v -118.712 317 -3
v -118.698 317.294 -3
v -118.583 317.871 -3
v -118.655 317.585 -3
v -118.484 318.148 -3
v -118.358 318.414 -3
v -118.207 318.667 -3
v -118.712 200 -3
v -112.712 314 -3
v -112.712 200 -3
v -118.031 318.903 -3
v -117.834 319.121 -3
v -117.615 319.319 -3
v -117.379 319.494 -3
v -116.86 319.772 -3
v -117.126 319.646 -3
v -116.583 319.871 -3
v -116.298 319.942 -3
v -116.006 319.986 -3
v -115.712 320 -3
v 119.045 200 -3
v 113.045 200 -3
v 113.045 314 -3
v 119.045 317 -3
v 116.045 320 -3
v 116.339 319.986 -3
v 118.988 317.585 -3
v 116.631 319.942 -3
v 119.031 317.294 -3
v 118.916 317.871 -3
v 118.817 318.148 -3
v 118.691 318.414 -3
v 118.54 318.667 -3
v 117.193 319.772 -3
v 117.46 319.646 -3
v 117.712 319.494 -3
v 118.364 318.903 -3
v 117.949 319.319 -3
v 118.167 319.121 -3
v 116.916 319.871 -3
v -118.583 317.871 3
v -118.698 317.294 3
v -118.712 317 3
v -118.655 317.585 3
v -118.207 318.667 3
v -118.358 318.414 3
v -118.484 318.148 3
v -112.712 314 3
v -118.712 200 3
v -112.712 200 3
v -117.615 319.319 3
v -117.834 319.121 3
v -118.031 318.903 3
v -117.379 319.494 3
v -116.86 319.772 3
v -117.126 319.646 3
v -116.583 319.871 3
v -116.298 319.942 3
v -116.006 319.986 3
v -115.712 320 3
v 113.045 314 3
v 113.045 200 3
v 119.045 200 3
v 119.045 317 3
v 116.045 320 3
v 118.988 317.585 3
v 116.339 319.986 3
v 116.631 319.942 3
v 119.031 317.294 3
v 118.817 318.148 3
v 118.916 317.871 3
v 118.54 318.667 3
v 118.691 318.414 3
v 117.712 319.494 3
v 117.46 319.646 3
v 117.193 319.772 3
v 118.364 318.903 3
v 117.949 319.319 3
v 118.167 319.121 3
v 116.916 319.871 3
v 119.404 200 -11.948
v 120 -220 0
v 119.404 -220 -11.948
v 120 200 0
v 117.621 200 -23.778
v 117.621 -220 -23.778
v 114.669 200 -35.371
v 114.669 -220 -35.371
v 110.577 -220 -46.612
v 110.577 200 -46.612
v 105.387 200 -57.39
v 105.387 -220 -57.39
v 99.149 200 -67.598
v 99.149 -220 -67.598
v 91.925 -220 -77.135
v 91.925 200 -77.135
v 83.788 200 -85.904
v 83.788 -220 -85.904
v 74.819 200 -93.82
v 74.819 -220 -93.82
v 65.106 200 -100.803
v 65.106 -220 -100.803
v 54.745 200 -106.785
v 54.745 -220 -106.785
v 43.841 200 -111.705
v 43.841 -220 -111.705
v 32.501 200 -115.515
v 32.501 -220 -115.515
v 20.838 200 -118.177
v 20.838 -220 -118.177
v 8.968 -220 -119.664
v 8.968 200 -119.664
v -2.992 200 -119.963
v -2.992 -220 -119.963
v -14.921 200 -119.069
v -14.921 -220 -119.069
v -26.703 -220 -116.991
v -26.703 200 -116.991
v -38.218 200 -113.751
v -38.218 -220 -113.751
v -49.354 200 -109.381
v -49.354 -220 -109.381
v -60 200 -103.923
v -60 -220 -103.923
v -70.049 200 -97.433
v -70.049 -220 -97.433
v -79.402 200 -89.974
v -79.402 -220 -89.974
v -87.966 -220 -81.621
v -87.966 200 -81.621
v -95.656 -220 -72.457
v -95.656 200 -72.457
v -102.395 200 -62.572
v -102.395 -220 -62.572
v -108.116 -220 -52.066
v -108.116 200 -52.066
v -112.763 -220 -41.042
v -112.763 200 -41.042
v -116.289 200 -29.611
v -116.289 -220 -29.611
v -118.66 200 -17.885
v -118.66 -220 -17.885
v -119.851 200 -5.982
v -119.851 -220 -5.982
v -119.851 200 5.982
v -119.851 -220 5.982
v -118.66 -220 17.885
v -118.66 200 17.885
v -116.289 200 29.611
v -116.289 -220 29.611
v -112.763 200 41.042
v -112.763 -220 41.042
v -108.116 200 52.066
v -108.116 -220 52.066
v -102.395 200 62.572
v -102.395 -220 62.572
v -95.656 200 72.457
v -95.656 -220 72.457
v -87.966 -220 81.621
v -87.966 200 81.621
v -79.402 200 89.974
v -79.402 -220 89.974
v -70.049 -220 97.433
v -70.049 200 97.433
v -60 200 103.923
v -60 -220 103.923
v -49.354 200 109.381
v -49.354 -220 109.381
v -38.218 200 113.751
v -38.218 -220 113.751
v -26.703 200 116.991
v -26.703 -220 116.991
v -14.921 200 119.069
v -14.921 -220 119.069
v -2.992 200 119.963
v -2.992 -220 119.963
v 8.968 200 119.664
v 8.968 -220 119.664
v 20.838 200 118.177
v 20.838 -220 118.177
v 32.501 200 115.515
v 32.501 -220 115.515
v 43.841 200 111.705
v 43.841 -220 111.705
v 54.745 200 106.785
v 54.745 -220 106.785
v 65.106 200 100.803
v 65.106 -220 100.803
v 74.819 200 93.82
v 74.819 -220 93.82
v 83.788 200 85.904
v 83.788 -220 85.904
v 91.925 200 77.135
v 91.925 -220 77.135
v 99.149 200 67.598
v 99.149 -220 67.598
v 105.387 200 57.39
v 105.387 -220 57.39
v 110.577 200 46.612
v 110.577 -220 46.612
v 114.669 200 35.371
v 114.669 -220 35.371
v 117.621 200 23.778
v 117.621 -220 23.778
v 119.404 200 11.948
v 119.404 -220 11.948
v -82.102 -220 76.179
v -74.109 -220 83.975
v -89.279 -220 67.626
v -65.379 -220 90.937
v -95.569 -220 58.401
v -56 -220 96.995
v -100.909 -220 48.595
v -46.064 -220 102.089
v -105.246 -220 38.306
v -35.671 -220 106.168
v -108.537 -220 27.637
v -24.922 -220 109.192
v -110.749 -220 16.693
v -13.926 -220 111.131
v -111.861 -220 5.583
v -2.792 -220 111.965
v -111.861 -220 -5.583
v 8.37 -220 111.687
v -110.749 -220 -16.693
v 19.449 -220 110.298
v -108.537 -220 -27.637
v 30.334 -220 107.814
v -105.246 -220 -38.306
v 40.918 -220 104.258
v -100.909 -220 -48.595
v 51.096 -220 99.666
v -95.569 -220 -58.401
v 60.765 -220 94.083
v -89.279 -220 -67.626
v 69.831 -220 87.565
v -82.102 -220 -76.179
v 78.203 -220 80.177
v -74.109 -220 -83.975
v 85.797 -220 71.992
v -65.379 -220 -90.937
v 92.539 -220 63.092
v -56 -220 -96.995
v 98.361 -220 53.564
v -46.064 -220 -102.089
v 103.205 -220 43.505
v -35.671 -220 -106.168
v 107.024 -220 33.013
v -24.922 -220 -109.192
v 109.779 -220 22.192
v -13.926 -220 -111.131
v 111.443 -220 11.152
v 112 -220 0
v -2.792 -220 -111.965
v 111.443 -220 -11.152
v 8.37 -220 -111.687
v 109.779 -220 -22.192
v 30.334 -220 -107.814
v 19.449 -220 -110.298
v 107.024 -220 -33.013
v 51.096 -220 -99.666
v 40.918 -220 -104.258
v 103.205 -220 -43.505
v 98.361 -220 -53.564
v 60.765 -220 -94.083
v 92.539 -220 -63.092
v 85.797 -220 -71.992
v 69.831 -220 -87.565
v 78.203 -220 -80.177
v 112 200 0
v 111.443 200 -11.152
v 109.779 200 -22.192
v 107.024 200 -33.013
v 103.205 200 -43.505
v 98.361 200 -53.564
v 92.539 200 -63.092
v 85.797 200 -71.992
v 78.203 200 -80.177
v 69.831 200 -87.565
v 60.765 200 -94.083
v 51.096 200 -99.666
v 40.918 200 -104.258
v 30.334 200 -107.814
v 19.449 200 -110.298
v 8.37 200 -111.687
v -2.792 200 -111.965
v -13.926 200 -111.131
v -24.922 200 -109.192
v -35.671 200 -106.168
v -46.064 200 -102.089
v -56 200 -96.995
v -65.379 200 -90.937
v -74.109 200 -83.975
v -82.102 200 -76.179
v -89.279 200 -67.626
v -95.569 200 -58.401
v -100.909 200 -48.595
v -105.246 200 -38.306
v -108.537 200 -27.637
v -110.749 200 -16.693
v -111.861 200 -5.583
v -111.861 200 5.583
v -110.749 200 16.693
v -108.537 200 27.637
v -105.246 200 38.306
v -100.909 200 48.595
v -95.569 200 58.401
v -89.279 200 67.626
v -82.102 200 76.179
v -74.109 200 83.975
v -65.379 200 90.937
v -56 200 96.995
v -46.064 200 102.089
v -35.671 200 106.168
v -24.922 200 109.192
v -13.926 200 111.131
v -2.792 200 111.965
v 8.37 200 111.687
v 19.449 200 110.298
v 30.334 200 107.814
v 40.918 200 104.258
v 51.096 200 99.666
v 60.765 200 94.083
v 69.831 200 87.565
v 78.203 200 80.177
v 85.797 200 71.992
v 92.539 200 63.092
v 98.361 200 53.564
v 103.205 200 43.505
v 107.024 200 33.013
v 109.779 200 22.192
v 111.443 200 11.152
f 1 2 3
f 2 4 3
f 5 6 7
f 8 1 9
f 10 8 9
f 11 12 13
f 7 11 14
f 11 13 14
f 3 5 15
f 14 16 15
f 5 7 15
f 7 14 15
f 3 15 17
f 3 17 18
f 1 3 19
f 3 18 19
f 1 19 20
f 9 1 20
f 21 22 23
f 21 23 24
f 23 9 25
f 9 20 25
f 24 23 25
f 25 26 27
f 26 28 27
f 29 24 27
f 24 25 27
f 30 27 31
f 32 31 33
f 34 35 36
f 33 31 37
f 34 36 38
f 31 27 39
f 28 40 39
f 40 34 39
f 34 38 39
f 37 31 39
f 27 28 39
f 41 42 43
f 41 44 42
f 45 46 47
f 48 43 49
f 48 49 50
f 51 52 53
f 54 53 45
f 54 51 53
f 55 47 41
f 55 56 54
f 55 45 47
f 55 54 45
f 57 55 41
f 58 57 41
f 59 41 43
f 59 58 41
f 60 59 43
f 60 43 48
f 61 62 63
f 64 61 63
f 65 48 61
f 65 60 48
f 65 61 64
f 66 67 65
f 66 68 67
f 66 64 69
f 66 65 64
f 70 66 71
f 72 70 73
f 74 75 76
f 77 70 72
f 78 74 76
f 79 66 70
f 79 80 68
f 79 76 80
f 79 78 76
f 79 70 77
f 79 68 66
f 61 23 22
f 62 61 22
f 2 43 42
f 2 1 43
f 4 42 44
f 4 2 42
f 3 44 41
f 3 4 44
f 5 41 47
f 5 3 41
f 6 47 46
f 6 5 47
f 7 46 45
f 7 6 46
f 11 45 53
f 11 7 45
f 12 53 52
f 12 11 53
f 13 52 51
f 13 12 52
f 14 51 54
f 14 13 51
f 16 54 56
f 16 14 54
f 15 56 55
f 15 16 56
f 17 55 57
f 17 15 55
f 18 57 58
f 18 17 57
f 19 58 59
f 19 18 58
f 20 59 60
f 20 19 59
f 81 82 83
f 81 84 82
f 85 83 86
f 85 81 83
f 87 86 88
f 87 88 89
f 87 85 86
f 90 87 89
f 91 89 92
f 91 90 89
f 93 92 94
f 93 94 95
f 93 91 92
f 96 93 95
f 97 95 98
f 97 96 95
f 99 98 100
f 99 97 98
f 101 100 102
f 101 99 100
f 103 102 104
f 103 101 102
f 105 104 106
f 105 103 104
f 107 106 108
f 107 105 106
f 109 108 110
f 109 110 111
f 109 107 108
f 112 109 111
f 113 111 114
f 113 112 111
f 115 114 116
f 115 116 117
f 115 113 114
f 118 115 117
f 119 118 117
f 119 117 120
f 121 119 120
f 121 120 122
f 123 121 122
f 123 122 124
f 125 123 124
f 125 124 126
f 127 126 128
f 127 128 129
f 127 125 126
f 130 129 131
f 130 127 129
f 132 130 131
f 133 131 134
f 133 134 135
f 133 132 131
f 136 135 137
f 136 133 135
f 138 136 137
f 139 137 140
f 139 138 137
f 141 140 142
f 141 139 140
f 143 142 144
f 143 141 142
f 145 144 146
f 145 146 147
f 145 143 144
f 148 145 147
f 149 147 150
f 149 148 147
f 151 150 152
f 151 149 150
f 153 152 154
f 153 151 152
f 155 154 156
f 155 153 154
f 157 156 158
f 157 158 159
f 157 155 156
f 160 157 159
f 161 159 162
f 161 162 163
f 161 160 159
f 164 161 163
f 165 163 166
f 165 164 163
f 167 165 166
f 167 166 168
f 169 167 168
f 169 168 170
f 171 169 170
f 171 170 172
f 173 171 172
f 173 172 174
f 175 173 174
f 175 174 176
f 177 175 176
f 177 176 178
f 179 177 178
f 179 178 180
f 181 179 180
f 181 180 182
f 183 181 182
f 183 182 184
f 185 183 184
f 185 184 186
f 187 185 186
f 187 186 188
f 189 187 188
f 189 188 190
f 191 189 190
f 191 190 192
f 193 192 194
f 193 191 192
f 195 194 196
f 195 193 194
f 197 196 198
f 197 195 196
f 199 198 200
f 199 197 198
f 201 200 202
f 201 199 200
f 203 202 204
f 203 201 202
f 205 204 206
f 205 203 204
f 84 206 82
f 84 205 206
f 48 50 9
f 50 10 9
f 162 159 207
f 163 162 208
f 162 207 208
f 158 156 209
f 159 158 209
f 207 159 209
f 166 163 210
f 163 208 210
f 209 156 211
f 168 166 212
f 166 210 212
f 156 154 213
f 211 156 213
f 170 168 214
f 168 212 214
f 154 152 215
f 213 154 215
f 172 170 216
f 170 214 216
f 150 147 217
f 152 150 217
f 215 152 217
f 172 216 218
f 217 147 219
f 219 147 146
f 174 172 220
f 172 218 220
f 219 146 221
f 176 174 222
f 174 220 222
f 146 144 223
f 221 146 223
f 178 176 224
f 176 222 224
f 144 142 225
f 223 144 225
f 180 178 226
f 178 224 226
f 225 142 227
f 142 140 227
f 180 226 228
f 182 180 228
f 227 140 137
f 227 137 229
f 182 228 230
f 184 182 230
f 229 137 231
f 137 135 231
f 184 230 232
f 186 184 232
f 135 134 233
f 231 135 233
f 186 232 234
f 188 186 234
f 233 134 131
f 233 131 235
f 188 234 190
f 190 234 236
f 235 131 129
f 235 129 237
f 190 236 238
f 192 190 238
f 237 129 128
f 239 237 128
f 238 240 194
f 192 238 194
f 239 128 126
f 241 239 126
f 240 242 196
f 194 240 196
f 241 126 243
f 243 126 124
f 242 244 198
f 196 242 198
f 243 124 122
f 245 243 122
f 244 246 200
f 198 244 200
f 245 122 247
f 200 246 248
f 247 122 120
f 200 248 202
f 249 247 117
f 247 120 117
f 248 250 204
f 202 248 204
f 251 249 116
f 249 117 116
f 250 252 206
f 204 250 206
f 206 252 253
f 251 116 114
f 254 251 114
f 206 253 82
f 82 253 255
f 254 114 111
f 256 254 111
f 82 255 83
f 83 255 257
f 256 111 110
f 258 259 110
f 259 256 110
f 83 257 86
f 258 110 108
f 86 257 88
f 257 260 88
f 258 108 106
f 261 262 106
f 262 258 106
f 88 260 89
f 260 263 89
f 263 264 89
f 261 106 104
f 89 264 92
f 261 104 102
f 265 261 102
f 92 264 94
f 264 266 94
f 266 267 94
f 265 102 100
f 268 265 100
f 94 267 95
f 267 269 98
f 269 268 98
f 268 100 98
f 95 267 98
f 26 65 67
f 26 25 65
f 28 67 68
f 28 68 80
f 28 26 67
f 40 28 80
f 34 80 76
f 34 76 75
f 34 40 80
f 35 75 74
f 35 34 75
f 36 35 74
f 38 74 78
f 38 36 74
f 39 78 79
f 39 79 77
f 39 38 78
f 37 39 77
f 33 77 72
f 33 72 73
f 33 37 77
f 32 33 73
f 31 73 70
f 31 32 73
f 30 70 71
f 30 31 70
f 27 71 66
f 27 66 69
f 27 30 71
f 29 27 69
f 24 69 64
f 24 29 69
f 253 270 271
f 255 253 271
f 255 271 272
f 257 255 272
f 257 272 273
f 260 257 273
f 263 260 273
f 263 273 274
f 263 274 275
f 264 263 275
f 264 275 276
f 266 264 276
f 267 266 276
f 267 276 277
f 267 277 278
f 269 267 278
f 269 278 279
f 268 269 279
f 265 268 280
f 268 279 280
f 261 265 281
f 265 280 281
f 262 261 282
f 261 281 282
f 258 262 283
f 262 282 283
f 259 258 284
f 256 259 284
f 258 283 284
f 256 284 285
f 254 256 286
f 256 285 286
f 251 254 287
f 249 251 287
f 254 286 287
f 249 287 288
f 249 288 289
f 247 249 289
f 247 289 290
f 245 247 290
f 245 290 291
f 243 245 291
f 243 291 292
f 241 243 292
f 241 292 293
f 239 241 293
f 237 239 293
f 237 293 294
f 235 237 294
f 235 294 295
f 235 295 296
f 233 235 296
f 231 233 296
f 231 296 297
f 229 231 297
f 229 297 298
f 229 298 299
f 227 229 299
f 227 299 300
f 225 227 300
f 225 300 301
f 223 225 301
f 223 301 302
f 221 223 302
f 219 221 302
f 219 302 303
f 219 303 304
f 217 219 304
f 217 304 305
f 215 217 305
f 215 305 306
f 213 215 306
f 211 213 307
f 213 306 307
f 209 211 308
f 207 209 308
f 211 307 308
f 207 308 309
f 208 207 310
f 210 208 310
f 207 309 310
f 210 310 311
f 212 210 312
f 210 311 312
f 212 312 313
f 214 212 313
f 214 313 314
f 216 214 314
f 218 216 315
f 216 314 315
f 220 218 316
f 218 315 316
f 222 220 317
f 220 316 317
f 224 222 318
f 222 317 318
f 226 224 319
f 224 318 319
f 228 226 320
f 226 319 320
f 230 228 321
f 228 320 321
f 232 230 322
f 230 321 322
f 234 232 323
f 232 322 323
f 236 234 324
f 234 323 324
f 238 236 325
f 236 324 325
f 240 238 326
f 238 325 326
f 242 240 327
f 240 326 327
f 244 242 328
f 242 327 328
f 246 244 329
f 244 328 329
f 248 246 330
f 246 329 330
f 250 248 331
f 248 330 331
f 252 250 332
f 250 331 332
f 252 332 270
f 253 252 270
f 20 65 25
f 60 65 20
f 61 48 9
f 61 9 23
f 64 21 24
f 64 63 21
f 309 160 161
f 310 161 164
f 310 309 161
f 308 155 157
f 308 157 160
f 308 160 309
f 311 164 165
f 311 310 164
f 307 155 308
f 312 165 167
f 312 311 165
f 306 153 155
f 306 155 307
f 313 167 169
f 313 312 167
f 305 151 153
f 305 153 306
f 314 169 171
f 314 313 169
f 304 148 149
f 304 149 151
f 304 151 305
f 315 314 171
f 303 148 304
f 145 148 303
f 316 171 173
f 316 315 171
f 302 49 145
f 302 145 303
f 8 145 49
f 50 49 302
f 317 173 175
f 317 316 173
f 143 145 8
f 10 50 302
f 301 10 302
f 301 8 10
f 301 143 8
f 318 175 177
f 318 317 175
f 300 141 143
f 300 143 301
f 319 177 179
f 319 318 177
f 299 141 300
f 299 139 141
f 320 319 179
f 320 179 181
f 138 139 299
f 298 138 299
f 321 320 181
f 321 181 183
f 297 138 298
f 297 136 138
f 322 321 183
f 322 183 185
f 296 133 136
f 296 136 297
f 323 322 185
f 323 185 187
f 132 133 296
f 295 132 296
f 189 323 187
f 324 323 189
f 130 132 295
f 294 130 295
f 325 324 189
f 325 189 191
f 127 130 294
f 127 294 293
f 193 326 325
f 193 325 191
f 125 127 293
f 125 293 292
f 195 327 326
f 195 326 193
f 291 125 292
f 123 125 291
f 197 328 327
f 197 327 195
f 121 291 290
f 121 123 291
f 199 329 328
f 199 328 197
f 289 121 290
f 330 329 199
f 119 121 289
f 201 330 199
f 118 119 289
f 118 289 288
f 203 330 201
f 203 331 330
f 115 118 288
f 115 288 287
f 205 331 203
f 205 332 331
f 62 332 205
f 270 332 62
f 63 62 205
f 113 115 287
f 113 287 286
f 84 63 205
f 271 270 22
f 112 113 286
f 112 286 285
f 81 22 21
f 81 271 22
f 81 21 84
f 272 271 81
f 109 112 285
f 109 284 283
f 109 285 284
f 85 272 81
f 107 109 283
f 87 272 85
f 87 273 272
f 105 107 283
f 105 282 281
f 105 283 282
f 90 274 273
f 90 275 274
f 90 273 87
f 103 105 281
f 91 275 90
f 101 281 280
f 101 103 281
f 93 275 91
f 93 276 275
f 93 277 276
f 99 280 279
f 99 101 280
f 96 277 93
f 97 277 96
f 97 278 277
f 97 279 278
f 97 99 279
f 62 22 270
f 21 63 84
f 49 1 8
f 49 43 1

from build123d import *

# Parameters (mm, degrees)
RESSALTO_EXTRUS_O1_DEPTH      = 200
RESSALTO_EXTRUS_O1_DEPTH_BACK = 220
ESBO_O1_R                     = 120
CORTE_EXTRUS_O1_REACH         = 454.99
ESBO_O2_R                     = 112
RESSALTO_EXTRUS_O3_DEPTH      = 3
RESSALTO_EXTRUS_O3_DEPTH_BACK = 3
FILETE2_R                     = 3


with BuildPart() as part:
    # Esboço1 → Ressalto-extrusão1 (new, two sides: drawn at the far end of the back side and taken through both)
    with BuildSketch(Plane(origin=(0, 0, 0), x_dir=(1, 0, 0), z_dir=(0, 1, 0)).offset(-RESSALTO_EXTRUS_O1_DEPTH_BACK)):
        Circle(ESBO_O1_R)
    extrude(amount=RESSALTO_EXTRUS_O1_DEPTH + RESSALTO_EXTRUS_O1_DEPTH_BACK)

    # Esboço2 → Corte-extrusão1 (cut, up to next)
    with BuildSketch(Plane(origin=(0, 200, 0), x_dir=(1, 0, 0), z_dir=(0, 1, 0)), mode=Mode.PRIVATE) as corte_extrus_o1_sk1:
        Circle(ESBO_O2_R)
    corte_extrus_o1_tool1 = extrude(corte_extrus_o1_sk1.sketch, amount=-CORTE_EXTRUS_O1_REACH, mode=Mode.PRIVATE) & part.part
    add(corte_extrus_o1_tool1.solids().sort_by_distance((0, 200, 0))[0], mode=Mode.SUBTRACT)

    # Esboço4 → Ressalto-extrusão3 (add, two sides: drawn at the far end of the back side and taken through both)
    with BuildSketch(Plane.XY.offset(-RESSALTO_EXTRUS_O3_DEPTH_BACK)):
        Polygon((-118.712281772, 320), (-118.712281772, 200), (-112.712281772, 200), (-112.712281772, 314), (113.045365563, 314), (113.045365563, 200), (119.045365563, 200), (119.045365563, 320), align=None)
    extrude(amount=RESSALTO_EXTRUS_O3_DEPTH + RESSALTO_EXTRUS_O3_DEPTH_BACK)

    # Filete2
    filete2_edges = [part.edges().sort_by_distance(p)[0] for p in [
        (-118.712281772, 320, 0),
        (119.045365563, 320, 0),
    ]]
    fillet(filete2_edges, radius=FILETE2_R)


solid = part.part
